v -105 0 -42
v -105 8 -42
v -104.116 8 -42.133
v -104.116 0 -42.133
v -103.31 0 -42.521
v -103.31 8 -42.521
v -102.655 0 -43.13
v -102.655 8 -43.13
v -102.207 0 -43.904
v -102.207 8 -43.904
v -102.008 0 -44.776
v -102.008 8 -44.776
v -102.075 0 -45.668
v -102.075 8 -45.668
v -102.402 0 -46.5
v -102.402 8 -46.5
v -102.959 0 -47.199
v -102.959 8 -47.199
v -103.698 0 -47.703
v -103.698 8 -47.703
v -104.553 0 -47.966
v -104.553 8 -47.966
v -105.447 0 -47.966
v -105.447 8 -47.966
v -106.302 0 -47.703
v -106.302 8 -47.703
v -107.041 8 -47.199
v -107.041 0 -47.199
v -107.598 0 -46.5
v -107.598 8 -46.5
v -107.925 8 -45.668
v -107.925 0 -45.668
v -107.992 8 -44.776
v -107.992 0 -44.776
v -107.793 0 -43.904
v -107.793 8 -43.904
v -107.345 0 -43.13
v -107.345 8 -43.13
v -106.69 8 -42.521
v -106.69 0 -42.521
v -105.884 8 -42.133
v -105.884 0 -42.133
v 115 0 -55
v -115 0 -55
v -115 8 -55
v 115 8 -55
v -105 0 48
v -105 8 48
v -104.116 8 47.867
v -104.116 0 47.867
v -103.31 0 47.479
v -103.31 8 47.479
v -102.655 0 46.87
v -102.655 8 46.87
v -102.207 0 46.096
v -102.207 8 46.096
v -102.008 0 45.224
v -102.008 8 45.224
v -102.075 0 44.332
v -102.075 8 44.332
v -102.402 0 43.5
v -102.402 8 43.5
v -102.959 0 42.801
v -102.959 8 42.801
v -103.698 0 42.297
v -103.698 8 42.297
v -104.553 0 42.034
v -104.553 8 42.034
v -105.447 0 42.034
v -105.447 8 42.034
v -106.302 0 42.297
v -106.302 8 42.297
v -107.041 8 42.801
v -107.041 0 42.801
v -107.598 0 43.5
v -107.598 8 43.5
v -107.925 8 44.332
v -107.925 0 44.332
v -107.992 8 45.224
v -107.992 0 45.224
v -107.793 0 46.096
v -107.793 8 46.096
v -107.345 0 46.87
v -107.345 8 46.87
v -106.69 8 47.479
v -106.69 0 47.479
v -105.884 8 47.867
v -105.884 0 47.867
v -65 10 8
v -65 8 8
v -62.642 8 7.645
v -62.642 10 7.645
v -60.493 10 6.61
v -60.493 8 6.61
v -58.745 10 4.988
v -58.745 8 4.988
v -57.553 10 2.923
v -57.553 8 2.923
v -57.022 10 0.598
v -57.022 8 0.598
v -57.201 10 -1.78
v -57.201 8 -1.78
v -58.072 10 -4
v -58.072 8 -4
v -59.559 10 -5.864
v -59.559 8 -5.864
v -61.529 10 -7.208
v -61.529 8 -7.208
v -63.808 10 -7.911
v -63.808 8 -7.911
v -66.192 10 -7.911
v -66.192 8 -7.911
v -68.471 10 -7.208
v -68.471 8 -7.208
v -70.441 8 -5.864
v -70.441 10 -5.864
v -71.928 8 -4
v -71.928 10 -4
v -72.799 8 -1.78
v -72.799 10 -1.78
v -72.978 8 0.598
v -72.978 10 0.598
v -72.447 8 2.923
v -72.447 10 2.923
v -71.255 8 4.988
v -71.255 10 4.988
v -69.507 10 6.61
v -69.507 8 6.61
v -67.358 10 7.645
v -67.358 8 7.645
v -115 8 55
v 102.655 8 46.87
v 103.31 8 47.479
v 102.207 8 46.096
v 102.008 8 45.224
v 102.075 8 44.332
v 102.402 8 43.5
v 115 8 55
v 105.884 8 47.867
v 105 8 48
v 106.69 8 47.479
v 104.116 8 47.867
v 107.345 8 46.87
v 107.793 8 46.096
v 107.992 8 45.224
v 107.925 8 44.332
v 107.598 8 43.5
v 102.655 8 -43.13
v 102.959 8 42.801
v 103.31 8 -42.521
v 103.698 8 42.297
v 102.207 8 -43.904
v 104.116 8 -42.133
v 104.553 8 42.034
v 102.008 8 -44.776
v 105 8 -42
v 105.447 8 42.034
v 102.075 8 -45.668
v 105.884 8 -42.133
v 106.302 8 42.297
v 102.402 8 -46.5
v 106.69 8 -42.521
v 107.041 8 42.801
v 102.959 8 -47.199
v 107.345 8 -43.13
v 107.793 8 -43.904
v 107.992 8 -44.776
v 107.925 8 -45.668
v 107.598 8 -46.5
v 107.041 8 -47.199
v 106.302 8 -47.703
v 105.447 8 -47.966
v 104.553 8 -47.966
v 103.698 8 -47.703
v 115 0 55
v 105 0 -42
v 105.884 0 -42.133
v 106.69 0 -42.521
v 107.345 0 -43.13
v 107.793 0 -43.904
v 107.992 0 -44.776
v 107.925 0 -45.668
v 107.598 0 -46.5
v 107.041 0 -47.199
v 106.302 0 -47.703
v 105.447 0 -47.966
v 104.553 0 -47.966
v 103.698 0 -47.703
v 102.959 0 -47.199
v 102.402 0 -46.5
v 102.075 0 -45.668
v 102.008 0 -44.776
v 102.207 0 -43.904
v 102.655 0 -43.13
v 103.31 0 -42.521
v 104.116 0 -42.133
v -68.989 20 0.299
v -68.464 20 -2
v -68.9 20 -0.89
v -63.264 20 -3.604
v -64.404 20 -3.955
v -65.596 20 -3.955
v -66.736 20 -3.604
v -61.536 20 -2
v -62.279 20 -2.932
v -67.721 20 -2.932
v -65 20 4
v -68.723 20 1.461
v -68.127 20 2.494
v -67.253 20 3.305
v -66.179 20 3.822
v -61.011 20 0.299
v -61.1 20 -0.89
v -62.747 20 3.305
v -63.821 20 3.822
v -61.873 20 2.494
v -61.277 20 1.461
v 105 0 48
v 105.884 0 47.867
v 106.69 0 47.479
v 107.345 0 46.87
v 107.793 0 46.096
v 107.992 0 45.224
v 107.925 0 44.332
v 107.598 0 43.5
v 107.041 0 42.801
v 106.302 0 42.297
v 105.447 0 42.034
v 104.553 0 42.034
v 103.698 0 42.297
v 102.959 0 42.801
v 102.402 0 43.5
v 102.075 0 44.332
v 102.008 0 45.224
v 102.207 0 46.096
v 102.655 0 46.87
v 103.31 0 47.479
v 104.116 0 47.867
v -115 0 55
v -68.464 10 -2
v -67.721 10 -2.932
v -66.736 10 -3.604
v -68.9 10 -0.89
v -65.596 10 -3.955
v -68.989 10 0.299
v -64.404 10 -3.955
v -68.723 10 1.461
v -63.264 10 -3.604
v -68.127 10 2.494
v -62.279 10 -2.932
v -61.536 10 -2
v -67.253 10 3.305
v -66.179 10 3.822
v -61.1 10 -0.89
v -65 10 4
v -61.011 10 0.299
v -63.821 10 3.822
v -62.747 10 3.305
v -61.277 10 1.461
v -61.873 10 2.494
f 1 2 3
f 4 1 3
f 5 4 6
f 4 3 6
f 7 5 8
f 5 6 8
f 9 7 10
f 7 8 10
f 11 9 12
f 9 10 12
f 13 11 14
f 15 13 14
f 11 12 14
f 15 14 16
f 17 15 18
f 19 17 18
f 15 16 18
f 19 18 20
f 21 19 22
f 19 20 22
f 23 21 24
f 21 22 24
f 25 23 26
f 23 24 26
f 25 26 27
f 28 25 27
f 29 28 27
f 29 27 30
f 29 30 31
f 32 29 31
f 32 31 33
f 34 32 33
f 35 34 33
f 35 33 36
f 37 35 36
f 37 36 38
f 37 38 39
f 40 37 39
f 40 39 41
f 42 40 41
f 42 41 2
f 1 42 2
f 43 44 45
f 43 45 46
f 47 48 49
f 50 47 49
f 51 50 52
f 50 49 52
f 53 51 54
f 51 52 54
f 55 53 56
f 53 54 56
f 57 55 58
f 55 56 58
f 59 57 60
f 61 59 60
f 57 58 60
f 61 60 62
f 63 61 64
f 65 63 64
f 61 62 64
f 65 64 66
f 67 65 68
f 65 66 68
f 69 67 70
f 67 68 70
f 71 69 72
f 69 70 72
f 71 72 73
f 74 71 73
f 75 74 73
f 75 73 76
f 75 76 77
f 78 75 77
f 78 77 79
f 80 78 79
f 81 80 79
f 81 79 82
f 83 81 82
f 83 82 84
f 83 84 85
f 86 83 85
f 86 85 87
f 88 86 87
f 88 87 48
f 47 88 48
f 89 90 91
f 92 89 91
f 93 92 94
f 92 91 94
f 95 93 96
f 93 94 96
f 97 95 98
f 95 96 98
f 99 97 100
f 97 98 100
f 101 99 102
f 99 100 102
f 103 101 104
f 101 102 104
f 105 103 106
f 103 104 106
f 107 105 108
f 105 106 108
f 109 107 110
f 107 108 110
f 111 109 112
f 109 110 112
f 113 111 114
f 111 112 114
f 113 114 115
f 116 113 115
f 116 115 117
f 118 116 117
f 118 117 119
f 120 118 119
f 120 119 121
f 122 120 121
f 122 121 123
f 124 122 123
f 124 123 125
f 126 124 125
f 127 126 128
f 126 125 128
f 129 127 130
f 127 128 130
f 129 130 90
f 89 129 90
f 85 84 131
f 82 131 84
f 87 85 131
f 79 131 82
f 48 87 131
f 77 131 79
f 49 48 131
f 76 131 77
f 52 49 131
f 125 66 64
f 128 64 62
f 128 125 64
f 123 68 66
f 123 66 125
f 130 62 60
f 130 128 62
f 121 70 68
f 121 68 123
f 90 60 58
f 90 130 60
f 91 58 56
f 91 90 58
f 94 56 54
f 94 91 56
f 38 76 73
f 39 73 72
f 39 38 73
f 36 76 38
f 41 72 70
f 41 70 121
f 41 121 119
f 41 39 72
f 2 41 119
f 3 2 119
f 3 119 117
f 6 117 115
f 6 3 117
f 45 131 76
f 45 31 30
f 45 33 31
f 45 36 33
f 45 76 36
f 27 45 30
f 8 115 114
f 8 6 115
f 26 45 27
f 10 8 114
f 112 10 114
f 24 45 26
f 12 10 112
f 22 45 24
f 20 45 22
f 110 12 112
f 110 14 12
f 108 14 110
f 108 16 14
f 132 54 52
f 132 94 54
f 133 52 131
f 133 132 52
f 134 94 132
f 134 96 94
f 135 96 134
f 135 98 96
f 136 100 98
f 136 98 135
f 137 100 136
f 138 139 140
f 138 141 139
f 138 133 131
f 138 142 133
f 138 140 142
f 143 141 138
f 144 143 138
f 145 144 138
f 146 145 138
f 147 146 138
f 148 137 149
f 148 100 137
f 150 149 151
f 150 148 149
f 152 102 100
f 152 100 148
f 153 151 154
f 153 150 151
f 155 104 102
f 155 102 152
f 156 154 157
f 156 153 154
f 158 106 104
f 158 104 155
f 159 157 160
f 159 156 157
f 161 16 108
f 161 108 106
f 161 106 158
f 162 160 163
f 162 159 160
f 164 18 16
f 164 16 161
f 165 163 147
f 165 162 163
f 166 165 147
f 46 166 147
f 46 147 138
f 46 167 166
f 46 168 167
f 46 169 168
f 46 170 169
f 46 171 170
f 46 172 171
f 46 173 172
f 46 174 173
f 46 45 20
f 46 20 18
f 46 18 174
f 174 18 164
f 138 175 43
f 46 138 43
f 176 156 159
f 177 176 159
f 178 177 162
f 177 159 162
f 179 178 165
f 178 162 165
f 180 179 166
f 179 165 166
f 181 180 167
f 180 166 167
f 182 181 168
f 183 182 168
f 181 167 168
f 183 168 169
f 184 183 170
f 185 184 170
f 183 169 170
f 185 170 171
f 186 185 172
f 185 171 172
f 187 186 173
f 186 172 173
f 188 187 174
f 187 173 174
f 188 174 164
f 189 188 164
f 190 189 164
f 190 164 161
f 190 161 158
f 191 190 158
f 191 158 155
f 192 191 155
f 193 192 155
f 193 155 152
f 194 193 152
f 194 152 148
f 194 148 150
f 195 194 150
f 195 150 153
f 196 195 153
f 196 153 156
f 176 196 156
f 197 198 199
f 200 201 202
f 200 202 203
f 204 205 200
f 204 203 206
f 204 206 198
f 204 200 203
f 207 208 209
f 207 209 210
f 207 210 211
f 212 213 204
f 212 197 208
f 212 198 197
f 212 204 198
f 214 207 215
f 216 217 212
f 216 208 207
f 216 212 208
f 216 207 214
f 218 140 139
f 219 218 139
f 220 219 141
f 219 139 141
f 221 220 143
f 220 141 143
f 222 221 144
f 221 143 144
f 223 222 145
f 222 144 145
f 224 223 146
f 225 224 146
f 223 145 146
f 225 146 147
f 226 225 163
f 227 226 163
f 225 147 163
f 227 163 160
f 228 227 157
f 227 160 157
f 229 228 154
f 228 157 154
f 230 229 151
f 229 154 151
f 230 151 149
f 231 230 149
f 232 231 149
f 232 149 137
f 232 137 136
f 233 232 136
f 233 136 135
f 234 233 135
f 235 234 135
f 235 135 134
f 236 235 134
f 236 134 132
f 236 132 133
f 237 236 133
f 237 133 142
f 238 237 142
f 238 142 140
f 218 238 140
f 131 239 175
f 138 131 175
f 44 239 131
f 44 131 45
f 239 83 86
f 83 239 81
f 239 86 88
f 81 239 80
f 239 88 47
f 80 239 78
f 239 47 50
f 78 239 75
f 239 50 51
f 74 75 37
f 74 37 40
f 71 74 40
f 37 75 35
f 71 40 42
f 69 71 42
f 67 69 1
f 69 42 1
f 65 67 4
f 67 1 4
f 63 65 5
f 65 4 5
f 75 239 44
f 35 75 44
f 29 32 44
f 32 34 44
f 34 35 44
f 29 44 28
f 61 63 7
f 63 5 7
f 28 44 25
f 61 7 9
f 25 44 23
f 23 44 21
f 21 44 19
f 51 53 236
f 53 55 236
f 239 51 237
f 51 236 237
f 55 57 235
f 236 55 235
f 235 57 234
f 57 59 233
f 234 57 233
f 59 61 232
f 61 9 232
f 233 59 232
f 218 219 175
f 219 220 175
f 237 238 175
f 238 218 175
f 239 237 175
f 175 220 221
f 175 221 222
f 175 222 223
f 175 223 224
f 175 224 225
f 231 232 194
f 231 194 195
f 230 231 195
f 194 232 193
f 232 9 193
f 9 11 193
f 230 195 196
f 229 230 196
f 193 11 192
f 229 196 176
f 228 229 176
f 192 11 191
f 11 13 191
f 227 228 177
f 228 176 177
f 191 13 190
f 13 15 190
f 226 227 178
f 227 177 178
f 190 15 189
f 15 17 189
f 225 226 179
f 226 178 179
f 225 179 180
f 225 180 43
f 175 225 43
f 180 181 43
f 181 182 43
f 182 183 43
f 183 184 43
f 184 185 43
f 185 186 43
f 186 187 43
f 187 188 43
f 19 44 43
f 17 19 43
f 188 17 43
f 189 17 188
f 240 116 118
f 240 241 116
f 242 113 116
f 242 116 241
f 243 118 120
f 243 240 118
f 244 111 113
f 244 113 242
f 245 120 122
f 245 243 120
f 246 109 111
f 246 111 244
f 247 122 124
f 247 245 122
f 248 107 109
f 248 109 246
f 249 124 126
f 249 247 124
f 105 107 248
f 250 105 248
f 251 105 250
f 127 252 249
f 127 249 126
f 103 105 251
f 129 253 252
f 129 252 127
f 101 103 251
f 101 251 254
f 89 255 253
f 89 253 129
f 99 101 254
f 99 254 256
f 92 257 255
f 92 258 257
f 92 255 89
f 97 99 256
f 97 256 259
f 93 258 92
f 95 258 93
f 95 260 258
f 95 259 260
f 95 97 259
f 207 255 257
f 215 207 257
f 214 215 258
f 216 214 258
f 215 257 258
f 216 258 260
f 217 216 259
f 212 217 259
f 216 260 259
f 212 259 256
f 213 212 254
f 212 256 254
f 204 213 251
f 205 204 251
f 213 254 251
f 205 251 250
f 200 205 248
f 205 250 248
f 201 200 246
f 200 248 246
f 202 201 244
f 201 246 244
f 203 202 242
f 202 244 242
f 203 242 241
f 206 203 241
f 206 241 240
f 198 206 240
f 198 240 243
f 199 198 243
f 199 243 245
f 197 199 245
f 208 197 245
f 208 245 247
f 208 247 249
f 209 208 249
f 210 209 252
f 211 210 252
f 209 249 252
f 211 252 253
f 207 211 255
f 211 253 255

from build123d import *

# Parameters (mm, degrees)
SKETCH_1_W          = 230
SKETCH_1_H          = 110
EXTRUDE_1_DEPTH     = 8
SKETCH_2_R          = 8
EXTRUDE_2_DEPTH     = 2
SKETCH_3_R          = 4
EXTRUDE_3_DEPTH     = 10
SKETCH_4_R          = 3
CUT_EXTRUDE_1_DEPTH = 129.039056541


with BuildPart() as part:
    # 草图1 → 凸台-拉伸1 (new body)
    with BuildSketch(Plane(origin=(0, 0, 0), x_dir=(1, 0, 0), z_dir=(0, 1, 0))):
        Rectangle(SKETCH_1_W, SKETCH_1_H)
    extrude(amount=EXTRUDE_1_DEPTH)

    # 草图2 → 凸台-拉伸2 (add)
    with BuildSketch(Plane(origin=(0, 8, 0), x_dir=(1, 0, 0), z_dir=(0, 1, 0))):
        with Locations(Location((-65, 0, 0), (0, 0, 270))):
            Circle(SKETCH_2_R)
    extrude(amount=EXTRUDE_2_DEPTH)

    # 草图3 → 凸台-拉伸3 (add)
    with BuildSketch(Plane(origin=(0, 10, 0), x_dir=(1, 0, 0), z_dir=(0, 1, 0))):
        with Locations(Location((-65, 0, 0), (0, 0, 270))):
            Circle(SKETCH_3_R)
    extrude(amount=EXTRUDE_3_DEPTH)

    # 草图4 → 切除-拉伸1 (cut, through all)
    with BuildSketch(Plane(origin=(0, 8, 0), x_dir=(1, 0, 0), z_dir=(0, 1, 0))):
        with Locations(Location((-105, 45, 0), (0, 0, 270))):
            Circle(SKETCH_4_R)
        with Locations(Location((-105, -45, 0), (0, 0, 270))):
            Circle(SKETCH_4_R)
        with Locations(Location((105, 45, 0), (0, 0, 270))):
            Circle(SKETCH_4_R)
        with Locations(Location((105, -45, 0), (0, 0, 270))):
            Circle(SKETCH_4_R)
    extrude(amount=-CUT_EXTRUDE_1_DEPTH, mode=Mode.SUBTRACT)


solid = part.part
